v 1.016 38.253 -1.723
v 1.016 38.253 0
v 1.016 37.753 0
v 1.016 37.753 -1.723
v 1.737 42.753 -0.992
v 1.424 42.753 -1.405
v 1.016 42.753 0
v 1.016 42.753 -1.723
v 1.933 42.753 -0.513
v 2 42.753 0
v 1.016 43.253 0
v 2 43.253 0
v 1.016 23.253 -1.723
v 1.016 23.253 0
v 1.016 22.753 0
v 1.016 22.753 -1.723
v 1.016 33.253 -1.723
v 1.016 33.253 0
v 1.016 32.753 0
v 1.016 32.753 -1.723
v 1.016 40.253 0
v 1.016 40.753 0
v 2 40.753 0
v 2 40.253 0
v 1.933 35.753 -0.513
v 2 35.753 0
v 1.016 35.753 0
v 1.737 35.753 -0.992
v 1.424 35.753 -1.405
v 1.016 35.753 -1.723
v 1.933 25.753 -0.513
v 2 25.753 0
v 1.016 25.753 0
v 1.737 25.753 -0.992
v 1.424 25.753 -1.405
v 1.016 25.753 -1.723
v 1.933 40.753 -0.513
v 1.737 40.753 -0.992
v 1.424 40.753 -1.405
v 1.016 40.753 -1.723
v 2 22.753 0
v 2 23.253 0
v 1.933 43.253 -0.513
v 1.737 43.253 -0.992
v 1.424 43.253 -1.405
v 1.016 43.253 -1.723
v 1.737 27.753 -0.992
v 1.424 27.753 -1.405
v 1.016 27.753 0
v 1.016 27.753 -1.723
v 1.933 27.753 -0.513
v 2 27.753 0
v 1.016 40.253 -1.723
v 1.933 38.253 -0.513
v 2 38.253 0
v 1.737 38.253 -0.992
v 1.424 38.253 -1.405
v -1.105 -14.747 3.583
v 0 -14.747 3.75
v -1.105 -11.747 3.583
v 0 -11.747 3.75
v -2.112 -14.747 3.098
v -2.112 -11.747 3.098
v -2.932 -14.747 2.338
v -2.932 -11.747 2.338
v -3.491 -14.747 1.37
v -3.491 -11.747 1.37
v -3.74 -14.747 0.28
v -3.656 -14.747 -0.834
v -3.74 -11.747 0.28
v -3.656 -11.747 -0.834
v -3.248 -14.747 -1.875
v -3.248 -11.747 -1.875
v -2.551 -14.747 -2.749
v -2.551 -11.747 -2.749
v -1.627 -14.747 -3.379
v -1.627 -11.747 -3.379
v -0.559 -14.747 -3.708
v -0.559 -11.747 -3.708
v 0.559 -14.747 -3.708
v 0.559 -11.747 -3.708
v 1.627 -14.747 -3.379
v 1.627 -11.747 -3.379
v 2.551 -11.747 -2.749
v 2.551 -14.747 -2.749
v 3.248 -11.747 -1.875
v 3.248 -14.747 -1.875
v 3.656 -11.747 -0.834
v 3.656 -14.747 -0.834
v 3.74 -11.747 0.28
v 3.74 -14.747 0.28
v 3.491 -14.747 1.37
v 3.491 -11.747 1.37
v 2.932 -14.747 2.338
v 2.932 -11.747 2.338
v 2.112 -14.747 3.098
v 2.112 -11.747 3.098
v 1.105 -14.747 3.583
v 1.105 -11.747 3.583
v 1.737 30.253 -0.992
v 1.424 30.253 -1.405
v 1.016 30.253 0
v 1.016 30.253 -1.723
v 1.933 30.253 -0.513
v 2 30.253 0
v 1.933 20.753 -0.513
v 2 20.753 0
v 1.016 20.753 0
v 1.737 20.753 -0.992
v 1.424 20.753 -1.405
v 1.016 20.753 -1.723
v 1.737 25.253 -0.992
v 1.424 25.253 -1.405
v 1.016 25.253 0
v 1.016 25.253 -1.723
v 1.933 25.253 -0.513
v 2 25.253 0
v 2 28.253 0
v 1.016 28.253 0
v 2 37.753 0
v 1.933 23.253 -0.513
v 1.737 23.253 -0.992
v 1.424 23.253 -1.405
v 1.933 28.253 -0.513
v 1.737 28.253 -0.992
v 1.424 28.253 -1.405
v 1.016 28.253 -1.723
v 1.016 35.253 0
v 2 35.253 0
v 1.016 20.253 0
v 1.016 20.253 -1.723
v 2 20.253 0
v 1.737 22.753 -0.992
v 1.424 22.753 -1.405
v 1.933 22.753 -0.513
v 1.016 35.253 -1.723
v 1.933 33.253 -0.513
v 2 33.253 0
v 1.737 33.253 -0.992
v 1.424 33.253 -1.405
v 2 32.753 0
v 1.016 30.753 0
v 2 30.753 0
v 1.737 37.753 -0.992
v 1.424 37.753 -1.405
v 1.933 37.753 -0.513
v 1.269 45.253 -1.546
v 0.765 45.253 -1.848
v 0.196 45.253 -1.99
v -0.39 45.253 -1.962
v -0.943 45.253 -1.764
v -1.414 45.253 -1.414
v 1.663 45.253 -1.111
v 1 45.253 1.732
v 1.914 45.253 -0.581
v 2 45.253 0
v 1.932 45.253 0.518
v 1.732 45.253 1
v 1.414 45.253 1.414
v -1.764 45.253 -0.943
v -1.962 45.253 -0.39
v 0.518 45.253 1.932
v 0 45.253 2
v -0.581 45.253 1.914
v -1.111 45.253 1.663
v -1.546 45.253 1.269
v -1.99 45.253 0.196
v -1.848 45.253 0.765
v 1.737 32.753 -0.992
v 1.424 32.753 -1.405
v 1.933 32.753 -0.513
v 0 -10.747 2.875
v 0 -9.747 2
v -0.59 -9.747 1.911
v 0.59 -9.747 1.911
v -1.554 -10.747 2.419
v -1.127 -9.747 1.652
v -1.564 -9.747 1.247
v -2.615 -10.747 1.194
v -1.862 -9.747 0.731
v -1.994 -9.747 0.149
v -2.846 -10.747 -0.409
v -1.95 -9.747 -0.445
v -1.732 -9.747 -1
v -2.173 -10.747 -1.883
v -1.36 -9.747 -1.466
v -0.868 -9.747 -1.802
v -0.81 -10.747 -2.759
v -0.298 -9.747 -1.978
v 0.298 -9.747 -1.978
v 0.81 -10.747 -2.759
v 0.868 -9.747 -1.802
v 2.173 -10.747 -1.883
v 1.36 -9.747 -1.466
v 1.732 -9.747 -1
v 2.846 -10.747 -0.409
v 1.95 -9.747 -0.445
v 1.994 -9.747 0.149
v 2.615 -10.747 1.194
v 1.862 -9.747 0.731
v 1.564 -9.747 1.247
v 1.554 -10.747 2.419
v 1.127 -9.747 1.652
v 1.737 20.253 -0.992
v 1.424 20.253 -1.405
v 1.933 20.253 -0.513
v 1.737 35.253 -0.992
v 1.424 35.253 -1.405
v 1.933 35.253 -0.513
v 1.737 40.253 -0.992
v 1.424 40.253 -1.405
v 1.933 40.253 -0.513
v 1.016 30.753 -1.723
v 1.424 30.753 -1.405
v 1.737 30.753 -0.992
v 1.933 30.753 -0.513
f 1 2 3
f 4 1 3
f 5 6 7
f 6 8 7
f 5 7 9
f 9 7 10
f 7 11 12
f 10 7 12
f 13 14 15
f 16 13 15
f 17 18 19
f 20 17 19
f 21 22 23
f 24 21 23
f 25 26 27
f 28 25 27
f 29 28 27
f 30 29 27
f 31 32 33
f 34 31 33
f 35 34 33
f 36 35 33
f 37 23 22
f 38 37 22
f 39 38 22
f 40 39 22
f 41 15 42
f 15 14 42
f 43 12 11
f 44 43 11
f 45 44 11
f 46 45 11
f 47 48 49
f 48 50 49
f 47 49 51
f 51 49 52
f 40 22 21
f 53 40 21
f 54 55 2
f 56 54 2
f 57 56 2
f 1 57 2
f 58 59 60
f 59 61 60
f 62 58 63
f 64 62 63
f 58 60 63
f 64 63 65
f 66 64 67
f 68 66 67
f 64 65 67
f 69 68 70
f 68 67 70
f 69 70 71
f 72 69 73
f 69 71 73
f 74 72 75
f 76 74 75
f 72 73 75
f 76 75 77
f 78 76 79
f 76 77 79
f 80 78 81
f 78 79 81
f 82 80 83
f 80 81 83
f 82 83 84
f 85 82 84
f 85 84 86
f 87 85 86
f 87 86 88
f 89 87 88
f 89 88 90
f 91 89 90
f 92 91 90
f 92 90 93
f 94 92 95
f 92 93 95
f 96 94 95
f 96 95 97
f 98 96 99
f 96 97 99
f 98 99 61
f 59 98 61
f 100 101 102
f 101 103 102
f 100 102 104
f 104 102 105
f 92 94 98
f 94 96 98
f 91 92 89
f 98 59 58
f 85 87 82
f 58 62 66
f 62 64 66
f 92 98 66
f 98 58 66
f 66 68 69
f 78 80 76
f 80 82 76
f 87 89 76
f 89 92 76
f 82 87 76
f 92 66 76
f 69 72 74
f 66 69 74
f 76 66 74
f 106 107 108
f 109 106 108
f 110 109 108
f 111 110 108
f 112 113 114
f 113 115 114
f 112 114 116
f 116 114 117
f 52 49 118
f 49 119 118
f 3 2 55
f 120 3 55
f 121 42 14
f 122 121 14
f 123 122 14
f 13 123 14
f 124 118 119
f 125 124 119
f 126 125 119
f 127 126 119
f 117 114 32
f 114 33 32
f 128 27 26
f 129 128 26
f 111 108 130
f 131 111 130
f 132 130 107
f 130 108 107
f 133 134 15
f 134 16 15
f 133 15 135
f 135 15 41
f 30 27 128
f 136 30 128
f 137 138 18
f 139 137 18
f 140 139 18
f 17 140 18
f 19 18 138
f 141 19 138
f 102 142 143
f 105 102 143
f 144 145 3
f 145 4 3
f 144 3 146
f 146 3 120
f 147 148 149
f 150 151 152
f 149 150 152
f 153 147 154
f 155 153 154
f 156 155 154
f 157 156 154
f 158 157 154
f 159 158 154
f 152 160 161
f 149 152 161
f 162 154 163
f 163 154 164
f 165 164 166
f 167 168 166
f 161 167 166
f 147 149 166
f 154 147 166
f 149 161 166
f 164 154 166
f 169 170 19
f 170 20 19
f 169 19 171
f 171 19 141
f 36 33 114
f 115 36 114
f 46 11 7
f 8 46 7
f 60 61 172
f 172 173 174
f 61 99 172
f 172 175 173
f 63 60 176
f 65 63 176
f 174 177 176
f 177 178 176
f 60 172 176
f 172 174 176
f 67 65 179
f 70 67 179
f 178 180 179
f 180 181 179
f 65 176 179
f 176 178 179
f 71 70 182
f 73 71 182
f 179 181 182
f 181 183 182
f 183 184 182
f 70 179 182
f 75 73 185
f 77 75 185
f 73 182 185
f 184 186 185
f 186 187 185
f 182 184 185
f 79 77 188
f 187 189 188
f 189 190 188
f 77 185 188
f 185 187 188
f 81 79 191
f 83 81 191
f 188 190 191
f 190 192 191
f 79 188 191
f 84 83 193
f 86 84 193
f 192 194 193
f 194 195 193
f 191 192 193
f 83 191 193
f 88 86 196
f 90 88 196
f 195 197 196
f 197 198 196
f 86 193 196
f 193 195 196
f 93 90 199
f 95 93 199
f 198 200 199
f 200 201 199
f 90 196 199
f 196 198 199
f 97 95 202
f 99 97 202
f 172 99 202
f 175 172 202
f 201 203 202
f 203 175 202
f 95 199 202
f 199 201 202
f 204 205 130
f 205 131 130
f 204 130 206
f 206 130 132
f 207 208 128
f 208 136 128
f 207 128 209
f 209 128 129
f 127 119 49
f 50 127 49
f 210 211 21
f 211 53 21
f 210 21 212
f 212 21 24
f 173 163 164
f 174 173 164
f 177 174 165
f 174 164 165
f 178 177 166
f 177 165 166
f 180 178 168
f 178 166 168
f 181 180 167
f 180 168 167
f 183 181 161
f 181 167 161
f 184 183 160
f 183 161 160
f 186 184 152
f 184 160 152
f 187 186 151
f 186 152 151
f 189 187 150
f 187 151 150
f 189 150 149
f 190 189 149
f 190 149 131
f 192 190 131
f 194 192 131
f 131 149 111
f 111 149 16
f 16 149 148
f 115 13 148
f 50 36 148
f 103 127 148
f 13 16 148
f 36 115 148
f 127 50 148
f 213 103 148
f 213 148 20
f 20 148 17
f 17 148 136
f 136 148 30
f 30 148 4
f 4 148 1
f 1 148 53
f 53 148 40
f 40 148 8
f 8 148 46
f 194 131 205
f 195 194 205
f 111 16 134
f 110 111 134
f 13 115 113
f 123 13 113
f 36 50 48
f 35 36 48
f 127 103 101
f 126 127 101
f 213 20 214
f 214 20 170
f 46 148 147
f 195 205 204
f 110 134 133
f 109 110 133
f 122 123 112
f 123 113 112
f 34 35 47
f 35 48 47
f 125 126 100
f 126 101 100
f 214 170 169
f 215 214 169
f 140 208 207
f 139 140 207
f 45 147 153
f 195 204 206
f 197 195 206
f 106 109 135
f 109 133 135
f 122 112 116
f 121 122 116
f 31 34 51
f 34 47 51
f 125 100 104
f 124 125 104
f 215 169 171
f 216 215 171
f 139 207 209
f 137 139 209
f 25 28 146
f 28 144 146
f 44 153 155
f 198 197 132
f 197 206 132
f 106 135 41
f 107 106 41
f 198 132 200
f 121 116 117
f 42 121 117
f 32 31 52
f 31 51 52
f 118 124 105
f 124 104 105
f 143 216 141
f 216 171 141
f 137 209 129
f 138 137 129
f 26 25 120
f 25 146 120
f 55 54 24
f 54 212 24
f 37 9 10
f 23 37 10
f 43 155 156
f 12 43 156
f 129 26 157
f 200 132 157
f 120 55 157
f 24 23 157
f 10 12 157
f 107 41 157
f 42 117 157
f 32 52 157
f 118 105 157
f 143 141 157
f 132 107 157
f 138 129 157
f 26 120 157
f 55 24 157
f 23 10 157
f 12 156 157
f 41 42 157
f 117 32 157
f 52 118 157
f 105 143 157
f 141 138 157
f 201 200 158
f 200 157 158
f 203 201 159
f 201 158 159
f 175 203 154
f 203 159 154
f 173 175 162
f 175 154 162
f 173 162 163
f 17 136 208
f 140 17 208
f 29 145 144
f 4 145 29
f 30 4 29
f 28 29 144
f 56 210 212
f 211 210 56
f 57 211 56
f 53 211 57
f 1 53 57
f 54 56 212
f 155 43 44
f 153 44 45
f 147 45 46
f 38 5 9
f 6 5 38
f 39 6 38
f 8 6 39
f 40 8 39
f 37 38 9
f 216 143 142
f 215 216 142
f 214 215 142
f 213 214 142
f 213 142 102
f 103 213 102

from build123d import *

# Parameters (mm, degrees)
CORTAR_EXTRUIR1_DEPTH = 46.56245087


with BuildPart() as part:
    # Croquis2 → Revolución1 (revolve)
    with BuildSketch(Plane.XY, mode=Mode.PRIVATE) as revoluci_n1_sk:
        Polygon((0, -14.74724396), (3.75, -14.74724396), (3.75, -11.74724396), (2, -9.74724396), (2, 45.25275604), (0, 45.25275604), align=None)
    revolve(revoluci_n1_sk.sketch.rotate(Axis((0, 34.083509453, 0), (0, -1, 0)), 90), axis=Axis((0, 34.083509453, 0), (0, -1, 0)))

    # Croquis3 → Cortar-Extruir1 (cut, through all)
    with BuildSketch(Plane.XY):
        Polygon((2, 45.25275604), (2, 43.25275604), (1.015724773, 43.25275604), (1.015724773, 42.75275604), (2, 42.75275604), (2, 40.75275604), (1.015724773, 40.75275604), (1.015724773, 40.25275604), (2, 40.25275604), (2, 38.25275604), (1.015724773, 38.25275604), (1.015724773, 37.75275604), (2, 37.75275604), (2, 35.75275604), (1.015724773, 35.75275604), (1.015724773, 35.25275604), (2, 35.25275604), (2, 33.25275604), (1.015724773, 33.25275604), (1.015724773, 32.75275604), (2, 32.75275604), (2, 30.75275604), (1.015724773, 30.75275604), (1.015724773, 30.25275604), (2, 30.25275604), (2, 28.25275604), (1.015724773, 28.25275604), (1.015724773, 27.75275604), (2, 27.75275604), (2, 25.75275604), (1.015724773, 25.75275604), (1.015724773, 25.25275604), (2, 25.25275604), (2, 23.25275604), (1.015724773, 23.25275604), (1.015724773, 22.75275604), (2, 22.75275604), (2, 20.75275604), (1.015724773, 20.75275604), (1.015724773, 20.25275604), (2, 20.25275604), (3.93485594, 20.25275604), (3.93485594, 45.25275604), align=None)
    extrude(amount=-CORTAR_EXTRUIR1_DEPTH, mode=Mode.SUBTRACT)


solid = part.part
